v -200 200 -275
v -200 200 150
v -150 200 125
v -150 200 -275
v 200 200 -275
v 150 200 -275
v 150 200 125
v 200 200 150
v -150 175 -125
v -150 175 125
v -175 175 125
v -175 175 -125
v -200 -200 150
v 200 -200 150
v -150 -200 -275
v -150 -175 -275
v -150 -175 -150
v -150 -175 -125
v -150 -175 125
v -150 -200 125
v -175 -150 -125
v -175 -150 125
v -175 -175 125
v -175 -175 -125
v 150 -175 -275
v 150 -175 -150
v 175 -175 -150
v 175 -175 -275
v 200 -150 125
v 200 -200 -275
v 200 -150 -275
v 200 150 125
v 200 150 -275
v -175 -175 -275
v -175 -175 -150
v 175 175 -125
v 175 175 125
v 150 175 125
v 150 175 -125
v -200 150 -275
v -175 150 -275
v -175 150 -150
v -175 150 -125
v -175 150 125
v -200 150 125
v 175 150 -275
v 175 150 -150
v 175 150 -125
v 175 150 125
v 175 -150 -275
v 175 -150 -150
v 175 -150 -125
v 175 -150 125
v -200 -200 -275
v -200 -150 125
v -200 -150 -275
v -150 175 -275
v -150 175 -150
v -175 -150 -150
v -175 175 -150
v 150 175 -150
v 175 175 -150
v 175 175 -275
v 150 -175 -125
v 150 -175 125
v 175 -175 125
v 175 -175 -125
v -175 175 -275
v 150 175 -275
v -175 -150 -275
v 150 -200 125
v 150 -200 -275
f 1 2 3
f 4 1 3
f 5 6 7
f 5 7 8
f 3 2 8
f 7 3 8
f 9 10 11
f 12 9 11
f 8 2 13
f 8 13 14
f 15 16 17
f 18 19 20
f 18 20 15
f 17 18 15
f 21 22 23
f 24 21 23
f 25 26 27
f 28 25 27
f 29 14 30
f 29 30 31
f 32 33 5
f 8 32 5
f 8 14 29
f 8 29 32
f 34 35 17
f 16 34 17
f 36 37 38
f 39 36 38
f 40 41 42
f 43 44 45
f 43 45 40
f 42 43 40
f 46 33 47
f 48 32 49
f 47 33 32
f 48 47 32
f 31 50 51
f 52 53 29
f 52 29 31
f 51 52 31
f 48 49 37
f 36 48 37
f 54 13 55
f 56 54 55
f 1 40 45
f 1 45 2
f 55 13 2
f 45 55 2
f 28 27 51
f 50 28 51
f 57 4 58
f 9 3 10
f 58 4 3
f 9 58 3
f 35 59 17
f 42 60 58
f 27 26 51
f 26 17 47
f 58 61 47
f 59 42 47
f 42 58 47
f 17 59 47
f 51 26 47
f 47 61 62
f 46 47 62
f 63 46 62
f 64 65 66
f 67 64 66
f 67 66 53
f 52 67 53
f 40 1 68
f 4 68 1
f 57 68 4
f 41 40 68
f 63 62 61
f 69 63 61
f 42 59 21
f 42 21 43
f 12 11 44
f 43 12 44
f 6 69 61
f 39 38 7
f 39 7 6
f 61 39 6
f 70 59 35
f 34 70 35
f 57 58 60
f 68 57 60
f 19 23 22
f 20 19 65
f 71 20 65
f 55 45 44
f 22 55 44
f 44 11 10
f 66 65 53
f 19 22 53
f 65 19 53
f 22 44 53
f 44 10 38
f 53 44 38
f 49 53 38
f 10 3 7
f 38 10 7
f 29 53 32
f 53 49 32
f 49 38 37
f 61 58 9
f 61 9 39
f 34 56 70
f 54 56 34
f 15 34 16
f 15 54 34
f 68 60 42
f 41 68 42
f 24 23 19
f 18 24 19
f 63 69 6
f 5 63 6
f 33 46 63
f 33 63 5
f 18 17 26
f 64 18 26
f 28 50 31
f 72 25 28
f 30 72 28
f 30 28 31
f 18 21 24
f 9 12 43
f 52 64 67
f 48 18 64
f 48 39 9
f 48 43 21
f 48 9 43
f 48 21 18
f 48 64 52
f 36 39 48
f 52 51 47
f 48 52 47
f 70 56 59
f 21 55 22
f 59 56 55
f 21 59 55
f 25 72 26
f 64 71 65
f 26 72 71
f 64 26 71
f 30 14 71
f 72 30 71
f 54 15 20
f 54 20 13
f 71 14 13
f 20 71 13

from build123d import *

# Parameters (mm, degrees)
F1_W     = 400
F1_H     = 400
F2_DEPTH = 25
F4_DEPTH = 400
F6_W     = 350
F6_H     = 350
F7_DEPTH = 25


with BuildPart() as f2:
    # F1 (on offset) → F2 (new body)
    with BuildSketch(Plane.XY.offset(150)):
        Rectangle(F1_W, F1_H)
    extrude(amount=-F2_DEPTH)

    # F3 (on face) → F4 (join)
    with BuildSketch(Plane(origin=(0, 0, 125), x_dir=(1, 0, 0), z_dir=(0, 0, -1))):
        Polygon((-200, 200), (-200, 150), (-175, 150), (-175, 175), (-150, 175), (-150, 200), align=None)
        Polygon((150, 175), (175, 175), (175, 150), (200, 150), (200, 200), (150, 200), align=None)
        Polygon((-150, -175), (-175, -175), (-175, -150), (-200, -150), (-200, -200), (-150, -200), align=None)
        Polygon((175, -150), (175, -175), (150, -175), (150, -200), (200, -200), (200, -150), align=None)
    extrude(amount=F4_DEPTH)

    # F6 (on offset) → F7 (join)
    with BuildSketch(Plane.XY.offset(-150)):
        Rectangle(F6_W, F6_H)
    extrude(amount=F7_DEPTH)


solid = f2.part
